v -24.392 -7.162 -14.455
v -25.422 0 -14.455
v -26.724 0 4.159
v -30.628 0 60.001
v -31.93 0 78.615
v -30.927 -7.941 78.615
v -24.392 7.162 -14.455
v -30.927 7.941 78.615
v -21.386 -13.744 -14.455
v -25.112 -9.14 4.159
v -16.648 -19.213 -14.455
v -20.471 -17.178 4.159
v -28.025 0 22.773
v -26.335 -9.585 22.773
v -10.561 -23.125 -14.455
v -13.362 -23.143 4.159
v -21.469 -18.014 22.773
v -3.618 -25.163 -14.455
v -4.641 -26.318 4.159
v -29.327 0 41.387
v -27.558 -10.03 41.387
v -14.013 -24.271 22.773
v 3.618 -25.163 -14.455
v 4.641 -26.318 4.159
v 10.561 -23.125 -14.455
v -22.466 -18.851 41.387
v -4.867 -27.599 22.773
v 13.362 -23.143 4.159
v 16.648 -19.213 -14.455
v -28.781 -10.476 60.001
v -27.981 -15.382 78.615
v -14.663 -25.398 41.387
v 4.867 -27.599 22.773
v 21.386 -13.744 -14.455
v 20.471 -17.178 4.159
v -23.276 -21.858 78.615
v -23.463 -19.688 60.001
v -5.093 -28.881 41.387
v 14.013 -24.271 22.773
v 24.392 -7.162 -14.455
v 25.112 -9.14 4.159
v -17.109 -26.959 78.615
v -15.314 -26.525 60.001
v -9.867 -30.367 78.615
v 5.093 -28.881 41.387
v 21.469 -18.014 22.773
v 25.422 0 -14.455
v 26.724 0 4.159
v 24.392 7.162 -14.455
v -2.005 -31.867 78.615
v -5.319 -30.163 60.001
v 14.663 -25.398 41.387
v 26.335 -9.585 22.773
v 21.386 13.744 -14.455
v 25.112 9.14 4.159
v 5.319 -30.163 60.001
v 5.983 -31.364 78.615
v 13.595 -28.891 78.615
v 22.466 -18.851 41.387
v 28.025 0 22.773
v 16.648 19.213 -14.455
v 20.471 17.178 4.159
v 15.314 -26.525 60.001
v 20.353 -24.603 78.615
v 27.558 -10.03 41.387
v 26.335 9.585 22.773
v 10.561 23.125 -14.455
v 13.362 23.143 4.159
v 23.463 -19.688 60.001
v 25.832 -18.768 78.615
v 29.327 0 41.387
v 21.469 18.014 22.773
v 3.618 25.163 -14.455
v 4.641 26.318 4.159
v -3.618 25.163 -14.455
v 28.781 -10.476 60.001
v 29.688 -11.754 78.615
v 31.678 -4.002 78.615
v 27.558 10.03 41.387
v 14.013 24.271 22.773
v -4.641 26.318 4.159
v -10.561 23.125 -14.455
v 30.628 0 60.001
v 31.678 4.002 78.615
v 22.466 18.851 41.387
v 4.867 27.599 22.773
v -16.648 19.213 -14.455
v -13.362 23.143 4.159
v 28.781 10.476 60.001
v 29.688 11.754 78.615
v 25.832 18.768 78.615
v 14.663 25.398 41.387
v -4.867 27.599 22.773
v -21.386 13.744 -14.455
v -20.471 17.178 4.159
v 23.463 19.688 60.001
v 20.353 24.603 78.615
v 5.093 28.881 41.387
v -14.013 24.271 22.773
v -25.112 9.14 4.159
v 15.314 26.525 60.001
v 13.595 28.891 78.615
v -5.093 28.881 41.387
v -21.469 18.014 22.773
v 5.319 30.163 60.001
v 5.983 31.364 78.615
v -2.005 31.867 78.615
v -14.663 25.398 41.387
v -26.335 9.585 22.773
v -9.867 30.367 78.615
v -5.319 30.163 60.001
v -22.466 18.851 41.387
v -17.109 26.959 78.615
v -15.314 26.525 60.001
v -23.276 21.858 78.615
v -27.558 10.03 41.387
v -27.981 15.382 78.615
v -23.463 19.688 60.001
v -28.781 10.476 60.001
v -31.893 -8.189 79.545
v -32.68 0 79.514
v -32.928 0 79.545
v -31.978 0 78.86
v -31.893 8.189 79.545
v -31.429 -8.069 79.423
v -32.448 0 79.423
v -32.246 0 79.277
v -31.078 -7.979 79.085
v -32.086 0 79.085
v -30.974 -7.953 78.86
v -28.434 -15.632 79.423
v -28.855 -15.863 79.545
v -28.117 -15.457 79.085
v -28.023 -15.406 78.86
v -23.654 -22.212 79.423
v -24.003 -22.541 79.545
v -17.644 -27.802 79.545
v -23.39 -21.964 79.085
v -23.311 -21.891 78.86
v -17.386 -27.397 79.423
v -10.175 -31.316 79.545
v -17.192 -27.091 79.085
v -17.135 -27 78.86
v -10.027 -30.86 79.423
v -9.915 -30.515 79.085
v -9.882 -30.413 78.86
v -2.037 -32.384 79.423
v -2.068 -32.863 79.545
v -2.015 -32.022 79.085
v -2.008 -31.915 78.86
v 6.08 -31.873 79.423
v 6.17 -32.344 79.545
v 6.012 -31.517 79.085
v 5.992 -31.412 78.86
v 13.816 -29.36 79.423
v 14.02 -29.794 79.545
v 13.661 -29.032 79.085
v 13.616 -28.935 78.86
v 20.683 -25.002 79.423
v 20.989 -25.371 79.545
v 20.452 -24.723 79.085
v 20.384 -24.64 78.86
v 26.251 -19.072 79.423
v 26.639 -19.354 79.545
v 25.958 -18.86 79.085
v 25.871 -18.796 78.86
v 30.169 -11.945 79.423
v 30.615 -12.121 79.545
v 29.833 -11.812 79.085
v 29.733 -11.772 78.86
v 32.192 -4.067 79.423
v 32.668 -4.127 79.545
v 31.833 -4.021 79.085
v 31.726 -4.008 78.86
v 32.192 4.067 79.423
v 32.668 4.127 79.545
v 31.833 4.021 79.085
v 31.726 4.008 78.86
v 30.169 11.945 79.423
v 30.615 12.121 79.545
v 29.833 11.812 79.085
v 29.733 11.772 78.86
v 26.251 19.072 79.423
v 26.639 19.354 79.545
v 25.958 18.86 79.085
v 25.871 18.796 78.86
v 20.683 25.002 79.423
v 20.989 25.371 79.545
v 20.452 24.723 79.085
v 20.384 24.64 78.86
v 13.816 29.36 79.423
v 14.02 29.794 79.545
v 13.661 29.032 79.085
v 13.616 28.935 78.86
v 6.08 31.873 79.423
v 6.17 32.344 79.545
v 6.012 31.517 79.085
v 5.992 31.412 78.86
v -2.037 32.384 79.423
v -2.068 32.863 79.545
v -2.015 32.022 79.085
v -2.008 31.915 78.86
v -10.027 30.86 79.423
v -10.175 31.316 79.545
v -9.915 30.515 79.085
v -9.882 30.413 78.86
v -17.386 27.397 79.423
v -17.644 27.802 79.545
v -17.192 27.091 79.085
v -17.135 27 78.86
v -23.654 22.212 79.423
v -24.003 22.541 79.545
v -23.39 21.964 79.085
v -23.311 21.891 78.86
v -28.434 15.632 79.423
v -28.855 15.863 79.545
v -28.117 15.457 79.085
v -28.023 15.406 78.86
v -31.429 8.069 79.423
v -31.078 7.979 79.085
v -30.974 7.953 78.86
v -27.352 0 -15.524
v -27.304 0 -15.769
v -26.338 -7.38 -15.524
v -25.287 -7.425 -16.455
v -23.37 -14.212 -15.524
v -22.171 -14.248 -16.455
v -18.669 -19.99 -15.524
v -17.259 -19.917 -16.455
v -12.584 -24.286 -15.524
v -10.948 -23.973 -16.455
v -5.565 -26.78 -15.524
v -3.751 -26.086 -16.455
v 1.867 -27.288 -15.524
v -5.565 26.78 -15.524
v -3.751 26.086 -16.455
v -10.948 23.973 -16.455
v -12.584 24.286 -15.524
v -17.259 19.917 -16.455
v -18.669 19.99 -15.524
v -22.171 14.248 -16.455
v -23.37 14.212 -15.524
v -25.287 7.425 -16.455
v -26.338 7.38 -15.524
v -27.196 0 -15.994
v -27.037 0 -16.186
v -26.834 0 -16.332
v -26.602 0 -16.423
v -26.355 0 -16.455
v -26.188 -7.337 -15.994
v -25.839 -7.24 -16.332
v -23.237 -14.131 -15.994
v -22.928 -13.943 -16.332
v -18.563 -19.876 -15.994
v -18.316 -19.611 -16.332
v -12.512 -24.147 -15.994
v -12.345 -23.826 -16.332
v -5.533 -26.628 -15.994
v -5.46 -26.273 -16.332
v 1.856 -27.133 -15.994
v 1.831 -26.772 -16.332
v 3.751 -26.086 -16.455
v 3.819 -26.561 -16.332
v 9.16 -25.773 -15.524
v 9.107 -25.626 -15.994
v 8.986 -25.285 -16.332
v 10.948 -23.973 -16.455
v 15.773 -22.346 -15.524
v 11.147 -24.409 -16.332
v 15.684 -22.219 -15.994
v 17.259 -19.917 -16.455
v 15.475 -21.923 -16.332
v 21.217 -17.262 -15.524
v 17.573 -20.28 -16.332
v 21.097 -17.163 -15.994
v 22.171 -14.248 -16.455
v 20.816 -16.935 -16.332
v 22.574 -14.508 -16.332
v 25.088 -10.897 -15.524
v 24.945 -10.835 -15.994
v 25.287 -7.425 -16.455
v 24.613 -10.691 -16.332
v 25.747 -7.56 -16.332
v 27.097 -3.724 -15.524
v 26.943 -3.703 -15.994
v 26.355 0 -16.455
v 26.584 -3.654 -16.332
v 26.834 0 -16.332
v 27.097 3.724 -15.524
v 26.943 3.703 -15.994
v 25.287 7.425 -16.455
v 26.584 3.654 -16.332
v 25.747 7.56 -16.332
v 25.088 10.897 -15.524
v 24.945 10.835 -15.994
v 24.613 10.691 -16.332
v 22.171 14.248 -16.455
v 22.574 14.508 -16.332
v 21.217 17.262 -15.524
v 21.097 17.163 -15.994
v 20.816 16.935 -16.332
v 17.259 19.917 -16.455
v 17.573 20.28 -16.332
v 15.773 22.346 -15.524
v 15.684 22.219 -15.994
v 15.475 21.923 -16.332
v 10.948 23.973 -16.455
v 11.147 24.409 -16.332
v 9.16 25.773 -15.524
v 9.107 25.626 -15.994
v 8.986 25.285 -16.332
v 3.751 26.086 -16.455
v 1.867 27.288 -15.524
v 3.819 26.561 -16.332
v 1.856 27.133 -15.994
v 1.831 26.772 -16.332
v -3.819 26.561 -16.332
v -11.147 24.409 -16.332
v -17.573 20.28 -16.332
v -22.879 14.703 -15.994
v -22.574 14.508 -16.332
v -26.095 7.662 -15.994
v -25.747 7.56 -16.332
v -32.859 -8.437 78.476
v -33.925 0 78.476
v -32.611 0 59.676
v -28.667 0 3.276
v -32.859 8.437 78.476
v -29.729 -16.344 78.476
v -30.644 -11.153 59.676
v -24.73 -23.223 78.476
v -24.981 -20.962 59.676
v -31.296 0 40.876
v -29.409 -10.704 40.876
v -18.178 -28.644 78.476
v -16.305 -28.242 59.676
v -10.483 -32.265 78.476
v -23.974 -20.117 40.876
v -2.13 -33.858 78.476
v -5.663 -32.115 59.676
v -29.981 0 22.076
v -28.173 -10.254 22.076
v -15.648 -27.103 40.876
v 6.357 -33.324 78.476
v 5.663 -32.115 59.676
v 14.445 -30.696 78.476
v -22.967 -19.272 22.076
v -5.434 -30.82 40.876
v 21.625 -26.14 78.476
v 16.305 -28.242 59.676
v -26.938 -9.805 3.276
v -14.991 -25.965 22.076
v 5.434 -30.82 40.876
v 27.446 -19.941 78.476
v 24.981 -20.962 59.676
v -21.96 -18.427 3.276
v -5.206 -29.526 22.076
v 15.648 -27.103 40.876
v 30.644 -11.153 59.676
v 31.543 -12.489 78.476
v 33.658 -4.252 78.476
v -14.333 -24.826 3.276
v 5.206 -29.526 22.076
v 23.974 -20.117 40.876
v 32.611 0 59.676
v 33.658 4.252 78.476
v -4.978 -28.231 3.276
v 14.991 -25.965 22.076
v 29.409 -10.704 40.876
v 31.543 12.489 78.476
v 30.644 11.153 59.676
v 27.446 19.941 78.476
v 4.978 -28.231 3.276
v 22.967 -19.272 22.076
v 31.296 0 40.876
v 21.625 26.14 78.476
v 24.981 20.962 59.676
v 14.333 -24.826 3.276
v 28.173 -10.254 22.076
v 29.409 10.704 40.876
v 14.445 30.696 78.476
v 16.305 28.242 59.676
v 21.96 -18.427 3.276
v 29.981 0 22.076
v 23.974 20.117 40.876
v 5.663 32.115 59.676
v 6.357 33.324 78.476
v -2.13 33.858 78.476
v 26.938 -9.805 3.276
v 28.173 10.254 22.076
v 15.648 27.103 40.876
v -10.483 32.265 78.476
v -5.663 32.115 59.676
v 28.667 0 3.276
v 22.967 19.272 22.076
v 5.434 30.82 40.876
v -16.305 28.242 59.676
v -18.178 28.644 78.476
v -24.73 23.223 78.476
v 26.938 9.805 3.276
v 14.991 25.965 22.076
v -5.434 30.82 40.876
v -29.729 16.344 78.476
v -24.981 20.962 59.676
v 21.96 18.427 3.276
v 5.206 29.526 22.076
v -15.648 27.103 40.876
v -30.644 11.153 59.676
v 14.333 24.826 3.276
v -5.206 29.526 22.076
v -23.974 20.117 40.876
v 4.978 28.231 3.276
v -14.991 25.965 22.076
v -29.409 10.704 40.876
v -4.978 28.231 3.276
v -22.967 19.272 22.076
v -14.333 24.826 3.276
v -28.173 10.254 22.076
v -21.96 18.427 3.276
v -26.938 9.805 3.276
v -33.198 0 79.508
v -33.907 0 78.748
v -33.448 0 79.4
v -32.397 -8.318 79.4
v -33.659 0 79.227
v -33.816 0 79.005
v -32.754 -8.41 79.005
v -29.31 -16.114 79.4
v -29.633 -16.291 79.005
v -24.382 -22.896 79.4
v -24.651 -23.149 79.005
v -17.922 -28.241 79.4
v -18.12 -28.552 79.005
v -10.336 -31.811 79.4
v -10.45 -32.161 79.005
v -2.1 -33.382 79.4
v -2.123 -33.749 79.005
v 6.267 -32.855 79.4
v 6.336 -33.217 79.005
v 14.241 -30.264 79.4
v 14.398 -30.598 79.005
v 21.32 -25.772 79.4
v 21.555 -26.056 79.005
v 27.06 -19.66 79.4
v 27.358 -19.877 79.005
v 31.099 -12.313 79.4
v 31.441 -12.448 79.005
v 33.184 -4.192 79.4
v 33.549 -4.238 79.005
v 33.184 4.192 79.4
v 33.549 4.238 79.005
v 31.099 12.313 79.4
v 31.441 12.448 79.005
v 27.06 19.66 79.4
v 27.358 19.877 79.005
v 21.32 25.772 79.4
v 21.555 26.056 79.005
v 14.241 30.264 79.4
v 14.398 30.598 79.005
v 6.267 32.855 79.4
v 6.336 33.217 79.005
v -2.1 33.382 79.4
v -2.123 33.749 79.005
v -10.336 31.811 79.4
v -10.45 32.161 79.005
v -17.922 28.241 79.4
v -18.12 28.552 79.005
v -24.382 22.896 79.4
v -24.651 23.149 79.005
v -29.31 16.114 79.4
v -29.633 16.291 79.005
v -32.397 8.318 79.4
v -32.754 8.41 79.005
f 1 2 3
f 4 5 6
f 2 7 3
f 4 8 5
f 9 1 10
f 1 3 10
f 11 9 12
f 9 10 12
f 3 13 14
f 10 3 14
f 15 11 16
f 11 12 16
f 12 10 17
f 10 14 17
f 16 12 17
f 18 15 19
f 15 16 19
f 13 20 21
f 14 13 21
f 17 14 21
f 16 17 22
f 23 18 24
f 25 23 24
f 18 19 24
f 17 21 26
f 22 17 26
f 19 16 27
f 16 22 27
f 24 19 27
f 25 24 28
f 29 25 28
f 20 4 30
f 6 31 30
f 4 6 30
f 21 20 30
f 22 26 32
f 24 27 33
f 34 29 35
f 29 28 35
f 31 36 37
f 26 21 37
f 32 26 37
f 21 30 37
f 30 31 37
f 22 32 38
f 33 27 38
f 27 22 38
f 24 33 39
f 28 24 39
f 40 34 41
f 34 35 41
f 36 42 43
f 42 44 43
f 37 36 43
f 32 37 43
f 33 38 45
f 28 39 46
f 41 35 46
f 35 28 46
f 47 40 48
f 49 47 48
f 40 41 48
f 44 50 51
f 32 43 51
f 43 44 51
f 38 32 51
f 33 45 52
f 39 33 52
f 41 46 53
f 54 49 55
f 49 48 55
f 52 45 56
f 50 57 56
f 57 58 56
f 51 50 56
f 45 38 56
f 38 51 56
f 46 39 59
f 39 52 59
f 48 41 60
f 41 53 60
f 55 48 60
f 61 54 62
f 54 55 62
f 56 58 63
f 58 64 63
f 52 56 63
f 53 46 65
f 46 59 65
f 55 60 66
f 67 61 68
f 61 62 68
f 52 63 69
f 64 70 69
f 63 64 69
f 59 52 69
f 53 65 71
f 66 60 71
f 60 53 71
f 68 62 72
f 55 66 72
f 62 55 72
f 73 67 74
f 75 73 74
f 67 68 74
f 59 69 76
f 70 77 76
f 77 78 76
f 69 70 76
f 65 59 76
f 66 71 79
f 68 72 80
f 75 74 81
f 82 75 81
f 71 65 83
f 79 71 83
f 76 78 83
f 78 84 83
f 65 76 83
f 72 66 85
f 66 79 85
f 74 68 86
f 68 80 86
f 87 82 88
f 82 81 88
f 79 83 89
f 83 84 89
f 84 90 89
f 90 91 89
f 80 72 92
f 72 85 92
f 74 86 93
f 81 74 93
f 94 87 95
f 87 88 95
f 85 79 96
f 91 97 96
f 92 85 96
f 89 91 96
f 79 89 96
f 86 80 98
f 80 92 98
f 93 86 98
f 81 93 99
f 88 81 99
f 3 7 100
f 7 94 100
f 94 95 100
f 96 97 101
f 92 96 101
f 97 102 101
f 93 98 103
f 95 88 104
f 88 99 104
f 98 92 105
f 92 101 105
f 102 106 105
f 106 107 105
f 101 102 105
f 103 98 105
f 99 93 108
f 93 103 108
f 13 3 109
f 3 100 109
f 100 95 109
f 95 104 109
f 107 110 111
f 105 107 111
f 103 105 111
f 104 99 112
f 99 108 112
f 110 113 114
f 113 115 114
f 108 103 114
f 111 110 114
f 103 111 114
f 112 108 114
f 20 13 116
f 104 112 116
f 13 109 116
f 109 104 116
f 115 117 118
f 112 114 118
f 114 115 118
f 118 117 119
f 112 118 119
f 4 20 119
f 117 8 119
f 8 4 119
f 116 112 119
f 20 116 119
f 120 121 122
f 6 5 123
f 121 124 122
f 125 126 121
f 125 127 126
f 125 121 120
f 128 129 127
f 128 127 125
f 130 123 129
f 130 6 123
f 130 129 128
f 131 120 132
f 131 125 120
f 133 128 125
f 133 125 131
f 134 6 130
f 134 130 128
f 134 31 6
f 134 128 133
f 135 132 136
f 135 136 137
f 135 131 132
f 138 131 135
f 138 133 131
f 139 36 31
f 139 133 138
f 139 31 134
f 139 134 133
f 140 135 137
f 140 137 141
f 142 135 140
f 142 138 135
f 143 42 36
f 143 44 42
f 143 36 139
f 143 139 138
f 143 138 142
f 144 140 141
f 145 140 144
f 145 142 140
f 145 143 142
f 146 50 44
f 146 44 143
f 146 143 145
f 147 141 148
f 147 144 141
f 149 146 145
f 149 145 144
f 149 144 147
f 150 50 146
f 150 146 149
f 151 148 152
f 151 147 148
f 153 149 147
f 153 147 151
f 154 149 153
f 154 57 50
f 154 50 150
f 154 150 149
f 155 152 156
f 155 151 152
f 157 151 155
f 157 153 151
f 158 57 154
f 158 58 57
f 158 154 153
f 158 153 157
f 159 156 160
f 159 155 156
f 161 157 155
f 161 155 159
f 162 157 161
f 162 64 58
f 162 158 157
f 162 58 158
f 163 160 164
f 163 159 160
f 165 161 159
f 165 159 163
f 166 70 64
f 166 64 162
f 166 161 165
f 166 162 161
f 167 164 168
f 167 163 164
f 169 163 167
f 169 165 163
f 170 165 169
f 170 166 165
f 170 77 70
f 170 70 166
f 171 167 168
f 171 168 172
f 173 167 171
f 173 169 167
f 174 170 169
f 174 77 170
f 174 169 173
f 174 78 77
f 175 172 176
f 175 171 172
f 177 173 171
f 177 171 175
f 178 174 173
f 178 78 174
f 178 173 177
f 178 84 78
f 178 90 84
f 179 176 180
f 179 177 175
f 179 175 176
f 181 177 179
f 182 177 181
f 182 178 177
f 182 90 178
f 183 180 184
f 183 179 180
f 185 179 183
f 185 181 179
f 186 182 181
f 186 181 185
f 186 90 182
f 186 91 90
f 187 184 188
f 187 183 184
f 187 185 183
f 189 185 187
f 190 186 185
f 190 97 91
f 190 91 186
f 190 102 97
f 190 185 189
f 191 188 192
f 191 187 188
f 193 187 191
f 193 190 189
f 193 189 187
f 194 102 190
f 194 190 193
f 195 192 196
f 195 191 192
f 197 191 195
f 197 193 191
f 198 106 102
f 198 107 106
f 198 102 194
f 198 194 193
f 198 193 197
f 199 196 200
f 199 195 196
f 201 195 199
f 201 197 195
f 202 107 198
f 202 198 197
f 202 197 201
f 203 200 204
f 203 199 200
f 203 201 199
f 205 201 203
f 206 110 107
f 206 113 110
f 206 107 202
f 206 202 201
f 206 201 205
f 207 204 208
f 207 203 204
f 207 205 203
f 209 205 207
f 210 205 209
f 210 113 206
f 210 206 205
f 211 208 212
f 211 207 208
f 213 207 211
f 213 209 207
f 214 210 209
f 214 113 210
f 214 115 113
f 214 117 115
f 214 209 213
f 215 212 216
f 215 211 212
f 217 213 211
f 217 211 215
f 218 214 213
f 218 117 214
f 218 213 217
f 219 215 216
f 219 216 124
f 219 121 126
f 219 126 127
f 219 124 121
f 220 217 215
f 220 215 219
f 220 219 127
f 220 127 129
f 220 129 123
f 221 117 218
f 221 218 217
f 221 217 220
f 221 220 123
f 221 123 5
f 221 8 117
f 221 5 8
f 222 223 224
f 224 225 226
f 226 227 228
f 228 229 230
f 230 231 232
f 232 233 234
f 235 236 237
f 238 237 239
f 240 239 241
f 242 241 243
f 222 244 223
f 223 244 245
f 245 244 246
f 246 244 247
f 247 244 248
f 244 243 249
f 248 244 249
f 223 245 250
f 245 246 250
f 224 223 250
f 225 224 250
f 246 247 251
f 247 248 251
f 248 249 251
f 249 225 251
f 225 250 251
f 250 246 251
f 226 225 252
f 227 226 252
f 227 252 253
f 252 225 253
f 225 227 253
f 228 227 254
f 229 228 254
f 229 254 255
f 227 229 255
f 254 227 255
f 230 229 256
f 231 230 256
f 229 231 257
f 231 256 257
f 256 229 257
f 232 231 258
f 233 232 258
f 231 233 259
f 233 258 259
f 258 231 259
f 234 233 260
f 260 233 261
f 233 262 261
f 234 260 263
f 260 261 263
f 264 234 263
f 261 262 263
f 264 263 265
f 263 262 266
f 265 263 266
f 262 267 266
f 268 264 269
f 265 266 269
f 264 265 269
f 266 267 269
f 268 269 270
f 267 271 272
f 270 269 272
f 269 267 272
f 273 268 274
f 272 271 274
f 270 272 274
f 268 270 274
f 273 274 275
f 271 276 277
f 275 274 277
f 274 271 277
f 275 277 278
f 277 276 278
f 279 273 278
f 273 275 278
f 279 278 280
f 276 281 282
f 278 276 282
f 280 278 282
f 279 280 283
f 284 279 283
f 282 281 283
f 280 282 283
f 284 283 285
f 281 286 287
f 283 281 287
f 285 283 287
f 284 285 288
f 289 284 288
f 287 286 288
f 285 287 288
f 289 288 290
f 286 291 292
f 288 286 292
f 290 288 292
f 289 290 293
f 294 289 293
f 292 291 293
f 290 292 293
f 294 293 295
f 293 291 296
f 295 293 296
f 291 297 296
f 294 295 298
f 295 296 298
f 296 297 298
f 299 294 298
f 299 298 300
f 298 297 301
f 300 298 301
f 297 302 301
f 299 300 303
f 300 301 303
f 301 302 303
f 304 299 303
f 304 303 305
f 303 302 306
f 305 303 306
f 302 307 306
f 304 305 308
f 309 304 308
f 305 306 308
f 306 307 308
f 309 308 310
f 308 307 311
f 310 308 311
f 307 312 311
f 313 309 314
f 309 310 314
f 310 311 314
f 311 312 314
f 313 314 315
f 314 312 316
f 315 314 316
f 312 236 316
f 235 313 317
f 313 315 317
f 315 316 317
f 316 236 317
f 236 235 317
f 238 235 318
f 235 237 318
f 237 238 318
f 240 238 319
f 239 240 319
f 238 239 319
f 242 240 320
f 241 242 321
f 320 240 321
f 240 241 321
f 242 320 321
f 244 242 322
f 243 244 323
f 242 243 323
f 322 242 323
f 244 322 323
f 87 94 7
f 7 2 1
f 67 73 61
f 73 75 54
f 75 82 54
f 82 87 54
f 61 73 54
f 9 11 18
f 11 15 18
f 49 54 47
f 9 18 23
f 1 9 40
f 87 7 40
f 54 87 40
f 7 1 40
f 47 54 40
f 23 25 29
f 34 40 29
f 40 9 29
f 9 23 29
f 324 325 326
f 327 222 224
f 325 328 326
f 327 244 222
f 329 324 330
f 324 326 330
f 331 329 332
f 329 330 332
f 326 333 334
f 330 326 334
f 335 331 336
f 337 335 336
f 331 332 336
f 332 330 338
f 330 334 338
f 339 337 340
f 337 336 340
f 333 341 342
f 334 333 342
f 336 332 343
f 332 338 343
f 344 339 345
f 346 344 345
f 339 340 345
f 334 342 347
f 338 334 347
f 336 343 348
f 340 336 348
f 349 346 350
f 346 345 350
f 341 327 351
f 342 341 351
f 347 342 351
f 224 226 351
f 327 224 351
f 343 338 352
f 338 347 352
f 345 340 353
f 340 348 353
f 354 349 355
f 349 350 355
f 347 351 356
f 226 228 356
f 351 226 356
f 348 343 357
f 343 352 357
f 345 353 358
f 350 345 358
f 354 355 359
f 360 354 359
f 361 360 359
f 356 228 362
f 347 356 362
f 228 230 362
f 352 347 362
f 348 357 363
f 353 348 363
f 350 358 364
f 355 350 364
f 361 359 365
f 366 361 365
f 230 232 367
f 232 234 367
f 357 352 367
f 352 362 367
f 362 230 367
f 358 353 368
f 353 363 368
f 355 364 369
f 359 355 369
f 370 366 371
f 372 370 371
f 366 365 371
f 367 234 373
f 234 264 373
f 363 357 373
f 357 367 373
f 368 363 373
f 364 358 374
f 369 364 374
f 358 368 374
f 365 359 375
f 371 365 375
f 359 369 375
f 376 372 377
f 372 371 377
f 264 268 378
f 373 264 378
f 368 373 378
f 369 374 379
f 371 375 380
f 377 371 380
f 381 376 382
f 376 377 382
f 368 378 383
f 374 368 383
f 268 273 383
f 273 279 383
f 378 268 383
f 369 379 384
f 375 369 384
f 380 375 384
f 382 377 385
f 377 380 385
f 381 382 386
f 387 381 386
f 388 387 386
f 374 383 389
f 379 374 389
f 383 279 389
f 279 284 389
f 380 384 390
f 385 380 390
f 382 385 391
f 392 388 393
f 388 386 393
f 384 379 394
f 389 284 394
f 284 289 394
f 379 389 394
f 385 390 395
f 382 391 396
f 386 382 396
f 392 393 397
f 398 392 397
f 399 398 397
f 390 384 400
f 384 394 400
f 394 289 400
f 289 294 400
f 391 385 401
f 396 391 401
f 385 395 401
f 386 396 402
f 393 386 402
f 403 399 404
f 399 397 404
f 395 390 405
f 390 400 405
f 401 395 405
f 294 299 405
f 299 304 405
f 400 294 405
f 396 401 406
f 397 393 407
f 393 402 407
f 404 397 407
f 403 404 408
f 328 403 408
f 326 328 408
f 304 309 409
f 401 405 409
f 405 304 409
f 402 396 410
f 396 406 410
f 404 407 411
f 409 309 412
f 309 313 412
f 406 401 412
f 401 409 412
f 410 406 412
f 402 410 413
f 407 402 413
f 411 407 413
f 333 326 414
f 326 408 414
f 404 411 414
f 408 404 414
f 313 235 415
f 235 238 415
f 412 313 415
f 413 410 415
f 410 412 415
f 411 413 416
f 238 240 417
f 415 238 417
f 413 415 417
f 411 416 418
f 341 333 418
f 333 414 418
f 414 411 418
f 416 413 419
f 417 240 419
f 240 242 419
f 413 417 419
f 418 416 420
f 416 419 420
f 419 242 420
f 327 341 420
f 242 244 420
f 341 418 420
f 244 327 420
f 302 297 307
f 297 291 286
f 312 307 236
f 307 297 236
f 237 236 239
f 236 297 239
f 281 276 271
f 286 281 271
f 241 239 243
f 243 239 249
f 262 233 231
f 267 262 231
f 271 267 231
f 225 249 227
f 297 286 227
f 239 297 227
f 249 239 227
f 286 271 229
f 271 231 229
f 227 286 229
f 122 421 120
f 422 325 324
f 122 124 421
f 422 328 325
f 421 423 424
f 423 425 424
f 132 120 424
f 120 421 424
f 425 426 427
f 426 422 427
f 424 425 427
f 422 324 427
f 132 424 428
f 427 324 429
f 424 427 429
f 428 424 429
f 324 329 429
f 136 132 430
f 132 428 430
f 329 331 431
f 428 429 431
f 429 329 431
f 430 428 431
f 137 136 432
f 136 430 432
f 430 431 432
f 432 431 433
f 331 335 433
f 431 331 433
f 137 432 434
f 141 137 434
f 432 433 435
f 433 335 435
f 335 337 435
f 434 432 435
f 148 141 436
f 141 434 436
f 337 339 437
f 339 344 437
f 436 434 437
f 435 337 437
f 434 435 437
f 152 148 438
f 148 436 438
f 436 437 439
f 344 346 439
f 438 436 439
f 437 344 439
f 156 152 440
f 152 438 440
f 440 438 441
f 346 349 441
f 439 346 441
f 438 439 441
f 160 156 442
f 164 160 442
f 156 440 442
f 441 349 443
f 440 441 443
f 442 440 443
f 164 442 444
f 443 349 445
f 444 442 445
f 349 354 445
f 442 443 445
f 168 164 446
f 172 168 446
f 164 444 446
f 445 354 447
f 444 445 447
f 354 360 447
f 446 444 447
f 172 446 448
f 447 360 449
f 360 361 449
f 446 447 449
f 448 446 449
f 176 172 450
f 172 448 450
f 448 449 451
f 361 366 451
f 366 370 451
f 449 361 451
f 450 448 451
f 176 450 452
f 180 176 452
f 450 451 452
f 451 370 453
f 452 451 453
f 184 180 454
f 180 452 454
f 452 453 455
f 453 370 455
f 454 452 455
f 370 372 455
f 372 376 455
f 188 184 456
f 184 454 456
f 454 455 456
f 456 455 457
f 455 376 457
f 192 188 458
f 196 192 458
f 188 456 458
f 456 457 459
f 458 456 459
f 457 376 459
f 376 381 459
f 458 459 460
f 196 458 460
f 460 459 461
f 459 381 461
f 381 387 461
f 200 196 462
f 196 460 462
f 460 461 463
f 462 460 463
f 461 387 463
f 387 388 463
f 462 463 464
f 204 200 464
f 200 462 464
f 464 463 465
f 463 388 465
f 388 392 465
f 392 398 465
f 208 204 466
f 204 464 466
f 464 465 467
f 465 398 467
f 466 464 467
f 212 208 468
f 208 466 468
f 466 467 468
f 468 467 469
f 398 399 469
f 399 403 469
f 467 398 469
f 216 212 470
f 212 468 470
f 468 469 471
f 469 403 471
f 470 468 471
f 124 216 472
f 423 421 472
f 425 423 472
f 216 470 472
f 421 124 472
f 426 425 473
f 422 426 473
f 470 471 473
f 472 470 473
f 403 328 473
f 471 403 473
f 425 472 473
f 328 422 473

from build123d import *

# Parameters (mm, degrees)
F2_R = 0.99999


# Not quite as in the source:
# - a fillet or chamfer is up to 0.001 mm smaller than in the source, because OpenCascade refuses the exact size


with BuildPart() as f1:
    # F0 (on Front) → F1 (revolve)
    with BuildSketch(Plane.XZ):
        Polygon((-31.9951162038, 79.5454481112), (-34, 79.5454481112), (-27.2870260534, -16.4545518888), (0, -16.4545518888), (0, -14.4545518888), (-25.4219958811, -14.4545518888), align=None)
    revolve(axis=Axis((0, 0, -15.4545518888), (0, 0, 1)))

    # F2 (radius 1 in the source; OpenCascade refuses exactly that, so slightly less here)
    f2_edges = [f1.edges().sort_by_distance(p)[0] for p in [
        (27.287026, 0, -16.454552),
        (34, 0, 79.545448),
        (31.995116, 0, 79.545448),
    ]]
    fillet(f2_edges, radius=F2_R)


solid = f1.part
